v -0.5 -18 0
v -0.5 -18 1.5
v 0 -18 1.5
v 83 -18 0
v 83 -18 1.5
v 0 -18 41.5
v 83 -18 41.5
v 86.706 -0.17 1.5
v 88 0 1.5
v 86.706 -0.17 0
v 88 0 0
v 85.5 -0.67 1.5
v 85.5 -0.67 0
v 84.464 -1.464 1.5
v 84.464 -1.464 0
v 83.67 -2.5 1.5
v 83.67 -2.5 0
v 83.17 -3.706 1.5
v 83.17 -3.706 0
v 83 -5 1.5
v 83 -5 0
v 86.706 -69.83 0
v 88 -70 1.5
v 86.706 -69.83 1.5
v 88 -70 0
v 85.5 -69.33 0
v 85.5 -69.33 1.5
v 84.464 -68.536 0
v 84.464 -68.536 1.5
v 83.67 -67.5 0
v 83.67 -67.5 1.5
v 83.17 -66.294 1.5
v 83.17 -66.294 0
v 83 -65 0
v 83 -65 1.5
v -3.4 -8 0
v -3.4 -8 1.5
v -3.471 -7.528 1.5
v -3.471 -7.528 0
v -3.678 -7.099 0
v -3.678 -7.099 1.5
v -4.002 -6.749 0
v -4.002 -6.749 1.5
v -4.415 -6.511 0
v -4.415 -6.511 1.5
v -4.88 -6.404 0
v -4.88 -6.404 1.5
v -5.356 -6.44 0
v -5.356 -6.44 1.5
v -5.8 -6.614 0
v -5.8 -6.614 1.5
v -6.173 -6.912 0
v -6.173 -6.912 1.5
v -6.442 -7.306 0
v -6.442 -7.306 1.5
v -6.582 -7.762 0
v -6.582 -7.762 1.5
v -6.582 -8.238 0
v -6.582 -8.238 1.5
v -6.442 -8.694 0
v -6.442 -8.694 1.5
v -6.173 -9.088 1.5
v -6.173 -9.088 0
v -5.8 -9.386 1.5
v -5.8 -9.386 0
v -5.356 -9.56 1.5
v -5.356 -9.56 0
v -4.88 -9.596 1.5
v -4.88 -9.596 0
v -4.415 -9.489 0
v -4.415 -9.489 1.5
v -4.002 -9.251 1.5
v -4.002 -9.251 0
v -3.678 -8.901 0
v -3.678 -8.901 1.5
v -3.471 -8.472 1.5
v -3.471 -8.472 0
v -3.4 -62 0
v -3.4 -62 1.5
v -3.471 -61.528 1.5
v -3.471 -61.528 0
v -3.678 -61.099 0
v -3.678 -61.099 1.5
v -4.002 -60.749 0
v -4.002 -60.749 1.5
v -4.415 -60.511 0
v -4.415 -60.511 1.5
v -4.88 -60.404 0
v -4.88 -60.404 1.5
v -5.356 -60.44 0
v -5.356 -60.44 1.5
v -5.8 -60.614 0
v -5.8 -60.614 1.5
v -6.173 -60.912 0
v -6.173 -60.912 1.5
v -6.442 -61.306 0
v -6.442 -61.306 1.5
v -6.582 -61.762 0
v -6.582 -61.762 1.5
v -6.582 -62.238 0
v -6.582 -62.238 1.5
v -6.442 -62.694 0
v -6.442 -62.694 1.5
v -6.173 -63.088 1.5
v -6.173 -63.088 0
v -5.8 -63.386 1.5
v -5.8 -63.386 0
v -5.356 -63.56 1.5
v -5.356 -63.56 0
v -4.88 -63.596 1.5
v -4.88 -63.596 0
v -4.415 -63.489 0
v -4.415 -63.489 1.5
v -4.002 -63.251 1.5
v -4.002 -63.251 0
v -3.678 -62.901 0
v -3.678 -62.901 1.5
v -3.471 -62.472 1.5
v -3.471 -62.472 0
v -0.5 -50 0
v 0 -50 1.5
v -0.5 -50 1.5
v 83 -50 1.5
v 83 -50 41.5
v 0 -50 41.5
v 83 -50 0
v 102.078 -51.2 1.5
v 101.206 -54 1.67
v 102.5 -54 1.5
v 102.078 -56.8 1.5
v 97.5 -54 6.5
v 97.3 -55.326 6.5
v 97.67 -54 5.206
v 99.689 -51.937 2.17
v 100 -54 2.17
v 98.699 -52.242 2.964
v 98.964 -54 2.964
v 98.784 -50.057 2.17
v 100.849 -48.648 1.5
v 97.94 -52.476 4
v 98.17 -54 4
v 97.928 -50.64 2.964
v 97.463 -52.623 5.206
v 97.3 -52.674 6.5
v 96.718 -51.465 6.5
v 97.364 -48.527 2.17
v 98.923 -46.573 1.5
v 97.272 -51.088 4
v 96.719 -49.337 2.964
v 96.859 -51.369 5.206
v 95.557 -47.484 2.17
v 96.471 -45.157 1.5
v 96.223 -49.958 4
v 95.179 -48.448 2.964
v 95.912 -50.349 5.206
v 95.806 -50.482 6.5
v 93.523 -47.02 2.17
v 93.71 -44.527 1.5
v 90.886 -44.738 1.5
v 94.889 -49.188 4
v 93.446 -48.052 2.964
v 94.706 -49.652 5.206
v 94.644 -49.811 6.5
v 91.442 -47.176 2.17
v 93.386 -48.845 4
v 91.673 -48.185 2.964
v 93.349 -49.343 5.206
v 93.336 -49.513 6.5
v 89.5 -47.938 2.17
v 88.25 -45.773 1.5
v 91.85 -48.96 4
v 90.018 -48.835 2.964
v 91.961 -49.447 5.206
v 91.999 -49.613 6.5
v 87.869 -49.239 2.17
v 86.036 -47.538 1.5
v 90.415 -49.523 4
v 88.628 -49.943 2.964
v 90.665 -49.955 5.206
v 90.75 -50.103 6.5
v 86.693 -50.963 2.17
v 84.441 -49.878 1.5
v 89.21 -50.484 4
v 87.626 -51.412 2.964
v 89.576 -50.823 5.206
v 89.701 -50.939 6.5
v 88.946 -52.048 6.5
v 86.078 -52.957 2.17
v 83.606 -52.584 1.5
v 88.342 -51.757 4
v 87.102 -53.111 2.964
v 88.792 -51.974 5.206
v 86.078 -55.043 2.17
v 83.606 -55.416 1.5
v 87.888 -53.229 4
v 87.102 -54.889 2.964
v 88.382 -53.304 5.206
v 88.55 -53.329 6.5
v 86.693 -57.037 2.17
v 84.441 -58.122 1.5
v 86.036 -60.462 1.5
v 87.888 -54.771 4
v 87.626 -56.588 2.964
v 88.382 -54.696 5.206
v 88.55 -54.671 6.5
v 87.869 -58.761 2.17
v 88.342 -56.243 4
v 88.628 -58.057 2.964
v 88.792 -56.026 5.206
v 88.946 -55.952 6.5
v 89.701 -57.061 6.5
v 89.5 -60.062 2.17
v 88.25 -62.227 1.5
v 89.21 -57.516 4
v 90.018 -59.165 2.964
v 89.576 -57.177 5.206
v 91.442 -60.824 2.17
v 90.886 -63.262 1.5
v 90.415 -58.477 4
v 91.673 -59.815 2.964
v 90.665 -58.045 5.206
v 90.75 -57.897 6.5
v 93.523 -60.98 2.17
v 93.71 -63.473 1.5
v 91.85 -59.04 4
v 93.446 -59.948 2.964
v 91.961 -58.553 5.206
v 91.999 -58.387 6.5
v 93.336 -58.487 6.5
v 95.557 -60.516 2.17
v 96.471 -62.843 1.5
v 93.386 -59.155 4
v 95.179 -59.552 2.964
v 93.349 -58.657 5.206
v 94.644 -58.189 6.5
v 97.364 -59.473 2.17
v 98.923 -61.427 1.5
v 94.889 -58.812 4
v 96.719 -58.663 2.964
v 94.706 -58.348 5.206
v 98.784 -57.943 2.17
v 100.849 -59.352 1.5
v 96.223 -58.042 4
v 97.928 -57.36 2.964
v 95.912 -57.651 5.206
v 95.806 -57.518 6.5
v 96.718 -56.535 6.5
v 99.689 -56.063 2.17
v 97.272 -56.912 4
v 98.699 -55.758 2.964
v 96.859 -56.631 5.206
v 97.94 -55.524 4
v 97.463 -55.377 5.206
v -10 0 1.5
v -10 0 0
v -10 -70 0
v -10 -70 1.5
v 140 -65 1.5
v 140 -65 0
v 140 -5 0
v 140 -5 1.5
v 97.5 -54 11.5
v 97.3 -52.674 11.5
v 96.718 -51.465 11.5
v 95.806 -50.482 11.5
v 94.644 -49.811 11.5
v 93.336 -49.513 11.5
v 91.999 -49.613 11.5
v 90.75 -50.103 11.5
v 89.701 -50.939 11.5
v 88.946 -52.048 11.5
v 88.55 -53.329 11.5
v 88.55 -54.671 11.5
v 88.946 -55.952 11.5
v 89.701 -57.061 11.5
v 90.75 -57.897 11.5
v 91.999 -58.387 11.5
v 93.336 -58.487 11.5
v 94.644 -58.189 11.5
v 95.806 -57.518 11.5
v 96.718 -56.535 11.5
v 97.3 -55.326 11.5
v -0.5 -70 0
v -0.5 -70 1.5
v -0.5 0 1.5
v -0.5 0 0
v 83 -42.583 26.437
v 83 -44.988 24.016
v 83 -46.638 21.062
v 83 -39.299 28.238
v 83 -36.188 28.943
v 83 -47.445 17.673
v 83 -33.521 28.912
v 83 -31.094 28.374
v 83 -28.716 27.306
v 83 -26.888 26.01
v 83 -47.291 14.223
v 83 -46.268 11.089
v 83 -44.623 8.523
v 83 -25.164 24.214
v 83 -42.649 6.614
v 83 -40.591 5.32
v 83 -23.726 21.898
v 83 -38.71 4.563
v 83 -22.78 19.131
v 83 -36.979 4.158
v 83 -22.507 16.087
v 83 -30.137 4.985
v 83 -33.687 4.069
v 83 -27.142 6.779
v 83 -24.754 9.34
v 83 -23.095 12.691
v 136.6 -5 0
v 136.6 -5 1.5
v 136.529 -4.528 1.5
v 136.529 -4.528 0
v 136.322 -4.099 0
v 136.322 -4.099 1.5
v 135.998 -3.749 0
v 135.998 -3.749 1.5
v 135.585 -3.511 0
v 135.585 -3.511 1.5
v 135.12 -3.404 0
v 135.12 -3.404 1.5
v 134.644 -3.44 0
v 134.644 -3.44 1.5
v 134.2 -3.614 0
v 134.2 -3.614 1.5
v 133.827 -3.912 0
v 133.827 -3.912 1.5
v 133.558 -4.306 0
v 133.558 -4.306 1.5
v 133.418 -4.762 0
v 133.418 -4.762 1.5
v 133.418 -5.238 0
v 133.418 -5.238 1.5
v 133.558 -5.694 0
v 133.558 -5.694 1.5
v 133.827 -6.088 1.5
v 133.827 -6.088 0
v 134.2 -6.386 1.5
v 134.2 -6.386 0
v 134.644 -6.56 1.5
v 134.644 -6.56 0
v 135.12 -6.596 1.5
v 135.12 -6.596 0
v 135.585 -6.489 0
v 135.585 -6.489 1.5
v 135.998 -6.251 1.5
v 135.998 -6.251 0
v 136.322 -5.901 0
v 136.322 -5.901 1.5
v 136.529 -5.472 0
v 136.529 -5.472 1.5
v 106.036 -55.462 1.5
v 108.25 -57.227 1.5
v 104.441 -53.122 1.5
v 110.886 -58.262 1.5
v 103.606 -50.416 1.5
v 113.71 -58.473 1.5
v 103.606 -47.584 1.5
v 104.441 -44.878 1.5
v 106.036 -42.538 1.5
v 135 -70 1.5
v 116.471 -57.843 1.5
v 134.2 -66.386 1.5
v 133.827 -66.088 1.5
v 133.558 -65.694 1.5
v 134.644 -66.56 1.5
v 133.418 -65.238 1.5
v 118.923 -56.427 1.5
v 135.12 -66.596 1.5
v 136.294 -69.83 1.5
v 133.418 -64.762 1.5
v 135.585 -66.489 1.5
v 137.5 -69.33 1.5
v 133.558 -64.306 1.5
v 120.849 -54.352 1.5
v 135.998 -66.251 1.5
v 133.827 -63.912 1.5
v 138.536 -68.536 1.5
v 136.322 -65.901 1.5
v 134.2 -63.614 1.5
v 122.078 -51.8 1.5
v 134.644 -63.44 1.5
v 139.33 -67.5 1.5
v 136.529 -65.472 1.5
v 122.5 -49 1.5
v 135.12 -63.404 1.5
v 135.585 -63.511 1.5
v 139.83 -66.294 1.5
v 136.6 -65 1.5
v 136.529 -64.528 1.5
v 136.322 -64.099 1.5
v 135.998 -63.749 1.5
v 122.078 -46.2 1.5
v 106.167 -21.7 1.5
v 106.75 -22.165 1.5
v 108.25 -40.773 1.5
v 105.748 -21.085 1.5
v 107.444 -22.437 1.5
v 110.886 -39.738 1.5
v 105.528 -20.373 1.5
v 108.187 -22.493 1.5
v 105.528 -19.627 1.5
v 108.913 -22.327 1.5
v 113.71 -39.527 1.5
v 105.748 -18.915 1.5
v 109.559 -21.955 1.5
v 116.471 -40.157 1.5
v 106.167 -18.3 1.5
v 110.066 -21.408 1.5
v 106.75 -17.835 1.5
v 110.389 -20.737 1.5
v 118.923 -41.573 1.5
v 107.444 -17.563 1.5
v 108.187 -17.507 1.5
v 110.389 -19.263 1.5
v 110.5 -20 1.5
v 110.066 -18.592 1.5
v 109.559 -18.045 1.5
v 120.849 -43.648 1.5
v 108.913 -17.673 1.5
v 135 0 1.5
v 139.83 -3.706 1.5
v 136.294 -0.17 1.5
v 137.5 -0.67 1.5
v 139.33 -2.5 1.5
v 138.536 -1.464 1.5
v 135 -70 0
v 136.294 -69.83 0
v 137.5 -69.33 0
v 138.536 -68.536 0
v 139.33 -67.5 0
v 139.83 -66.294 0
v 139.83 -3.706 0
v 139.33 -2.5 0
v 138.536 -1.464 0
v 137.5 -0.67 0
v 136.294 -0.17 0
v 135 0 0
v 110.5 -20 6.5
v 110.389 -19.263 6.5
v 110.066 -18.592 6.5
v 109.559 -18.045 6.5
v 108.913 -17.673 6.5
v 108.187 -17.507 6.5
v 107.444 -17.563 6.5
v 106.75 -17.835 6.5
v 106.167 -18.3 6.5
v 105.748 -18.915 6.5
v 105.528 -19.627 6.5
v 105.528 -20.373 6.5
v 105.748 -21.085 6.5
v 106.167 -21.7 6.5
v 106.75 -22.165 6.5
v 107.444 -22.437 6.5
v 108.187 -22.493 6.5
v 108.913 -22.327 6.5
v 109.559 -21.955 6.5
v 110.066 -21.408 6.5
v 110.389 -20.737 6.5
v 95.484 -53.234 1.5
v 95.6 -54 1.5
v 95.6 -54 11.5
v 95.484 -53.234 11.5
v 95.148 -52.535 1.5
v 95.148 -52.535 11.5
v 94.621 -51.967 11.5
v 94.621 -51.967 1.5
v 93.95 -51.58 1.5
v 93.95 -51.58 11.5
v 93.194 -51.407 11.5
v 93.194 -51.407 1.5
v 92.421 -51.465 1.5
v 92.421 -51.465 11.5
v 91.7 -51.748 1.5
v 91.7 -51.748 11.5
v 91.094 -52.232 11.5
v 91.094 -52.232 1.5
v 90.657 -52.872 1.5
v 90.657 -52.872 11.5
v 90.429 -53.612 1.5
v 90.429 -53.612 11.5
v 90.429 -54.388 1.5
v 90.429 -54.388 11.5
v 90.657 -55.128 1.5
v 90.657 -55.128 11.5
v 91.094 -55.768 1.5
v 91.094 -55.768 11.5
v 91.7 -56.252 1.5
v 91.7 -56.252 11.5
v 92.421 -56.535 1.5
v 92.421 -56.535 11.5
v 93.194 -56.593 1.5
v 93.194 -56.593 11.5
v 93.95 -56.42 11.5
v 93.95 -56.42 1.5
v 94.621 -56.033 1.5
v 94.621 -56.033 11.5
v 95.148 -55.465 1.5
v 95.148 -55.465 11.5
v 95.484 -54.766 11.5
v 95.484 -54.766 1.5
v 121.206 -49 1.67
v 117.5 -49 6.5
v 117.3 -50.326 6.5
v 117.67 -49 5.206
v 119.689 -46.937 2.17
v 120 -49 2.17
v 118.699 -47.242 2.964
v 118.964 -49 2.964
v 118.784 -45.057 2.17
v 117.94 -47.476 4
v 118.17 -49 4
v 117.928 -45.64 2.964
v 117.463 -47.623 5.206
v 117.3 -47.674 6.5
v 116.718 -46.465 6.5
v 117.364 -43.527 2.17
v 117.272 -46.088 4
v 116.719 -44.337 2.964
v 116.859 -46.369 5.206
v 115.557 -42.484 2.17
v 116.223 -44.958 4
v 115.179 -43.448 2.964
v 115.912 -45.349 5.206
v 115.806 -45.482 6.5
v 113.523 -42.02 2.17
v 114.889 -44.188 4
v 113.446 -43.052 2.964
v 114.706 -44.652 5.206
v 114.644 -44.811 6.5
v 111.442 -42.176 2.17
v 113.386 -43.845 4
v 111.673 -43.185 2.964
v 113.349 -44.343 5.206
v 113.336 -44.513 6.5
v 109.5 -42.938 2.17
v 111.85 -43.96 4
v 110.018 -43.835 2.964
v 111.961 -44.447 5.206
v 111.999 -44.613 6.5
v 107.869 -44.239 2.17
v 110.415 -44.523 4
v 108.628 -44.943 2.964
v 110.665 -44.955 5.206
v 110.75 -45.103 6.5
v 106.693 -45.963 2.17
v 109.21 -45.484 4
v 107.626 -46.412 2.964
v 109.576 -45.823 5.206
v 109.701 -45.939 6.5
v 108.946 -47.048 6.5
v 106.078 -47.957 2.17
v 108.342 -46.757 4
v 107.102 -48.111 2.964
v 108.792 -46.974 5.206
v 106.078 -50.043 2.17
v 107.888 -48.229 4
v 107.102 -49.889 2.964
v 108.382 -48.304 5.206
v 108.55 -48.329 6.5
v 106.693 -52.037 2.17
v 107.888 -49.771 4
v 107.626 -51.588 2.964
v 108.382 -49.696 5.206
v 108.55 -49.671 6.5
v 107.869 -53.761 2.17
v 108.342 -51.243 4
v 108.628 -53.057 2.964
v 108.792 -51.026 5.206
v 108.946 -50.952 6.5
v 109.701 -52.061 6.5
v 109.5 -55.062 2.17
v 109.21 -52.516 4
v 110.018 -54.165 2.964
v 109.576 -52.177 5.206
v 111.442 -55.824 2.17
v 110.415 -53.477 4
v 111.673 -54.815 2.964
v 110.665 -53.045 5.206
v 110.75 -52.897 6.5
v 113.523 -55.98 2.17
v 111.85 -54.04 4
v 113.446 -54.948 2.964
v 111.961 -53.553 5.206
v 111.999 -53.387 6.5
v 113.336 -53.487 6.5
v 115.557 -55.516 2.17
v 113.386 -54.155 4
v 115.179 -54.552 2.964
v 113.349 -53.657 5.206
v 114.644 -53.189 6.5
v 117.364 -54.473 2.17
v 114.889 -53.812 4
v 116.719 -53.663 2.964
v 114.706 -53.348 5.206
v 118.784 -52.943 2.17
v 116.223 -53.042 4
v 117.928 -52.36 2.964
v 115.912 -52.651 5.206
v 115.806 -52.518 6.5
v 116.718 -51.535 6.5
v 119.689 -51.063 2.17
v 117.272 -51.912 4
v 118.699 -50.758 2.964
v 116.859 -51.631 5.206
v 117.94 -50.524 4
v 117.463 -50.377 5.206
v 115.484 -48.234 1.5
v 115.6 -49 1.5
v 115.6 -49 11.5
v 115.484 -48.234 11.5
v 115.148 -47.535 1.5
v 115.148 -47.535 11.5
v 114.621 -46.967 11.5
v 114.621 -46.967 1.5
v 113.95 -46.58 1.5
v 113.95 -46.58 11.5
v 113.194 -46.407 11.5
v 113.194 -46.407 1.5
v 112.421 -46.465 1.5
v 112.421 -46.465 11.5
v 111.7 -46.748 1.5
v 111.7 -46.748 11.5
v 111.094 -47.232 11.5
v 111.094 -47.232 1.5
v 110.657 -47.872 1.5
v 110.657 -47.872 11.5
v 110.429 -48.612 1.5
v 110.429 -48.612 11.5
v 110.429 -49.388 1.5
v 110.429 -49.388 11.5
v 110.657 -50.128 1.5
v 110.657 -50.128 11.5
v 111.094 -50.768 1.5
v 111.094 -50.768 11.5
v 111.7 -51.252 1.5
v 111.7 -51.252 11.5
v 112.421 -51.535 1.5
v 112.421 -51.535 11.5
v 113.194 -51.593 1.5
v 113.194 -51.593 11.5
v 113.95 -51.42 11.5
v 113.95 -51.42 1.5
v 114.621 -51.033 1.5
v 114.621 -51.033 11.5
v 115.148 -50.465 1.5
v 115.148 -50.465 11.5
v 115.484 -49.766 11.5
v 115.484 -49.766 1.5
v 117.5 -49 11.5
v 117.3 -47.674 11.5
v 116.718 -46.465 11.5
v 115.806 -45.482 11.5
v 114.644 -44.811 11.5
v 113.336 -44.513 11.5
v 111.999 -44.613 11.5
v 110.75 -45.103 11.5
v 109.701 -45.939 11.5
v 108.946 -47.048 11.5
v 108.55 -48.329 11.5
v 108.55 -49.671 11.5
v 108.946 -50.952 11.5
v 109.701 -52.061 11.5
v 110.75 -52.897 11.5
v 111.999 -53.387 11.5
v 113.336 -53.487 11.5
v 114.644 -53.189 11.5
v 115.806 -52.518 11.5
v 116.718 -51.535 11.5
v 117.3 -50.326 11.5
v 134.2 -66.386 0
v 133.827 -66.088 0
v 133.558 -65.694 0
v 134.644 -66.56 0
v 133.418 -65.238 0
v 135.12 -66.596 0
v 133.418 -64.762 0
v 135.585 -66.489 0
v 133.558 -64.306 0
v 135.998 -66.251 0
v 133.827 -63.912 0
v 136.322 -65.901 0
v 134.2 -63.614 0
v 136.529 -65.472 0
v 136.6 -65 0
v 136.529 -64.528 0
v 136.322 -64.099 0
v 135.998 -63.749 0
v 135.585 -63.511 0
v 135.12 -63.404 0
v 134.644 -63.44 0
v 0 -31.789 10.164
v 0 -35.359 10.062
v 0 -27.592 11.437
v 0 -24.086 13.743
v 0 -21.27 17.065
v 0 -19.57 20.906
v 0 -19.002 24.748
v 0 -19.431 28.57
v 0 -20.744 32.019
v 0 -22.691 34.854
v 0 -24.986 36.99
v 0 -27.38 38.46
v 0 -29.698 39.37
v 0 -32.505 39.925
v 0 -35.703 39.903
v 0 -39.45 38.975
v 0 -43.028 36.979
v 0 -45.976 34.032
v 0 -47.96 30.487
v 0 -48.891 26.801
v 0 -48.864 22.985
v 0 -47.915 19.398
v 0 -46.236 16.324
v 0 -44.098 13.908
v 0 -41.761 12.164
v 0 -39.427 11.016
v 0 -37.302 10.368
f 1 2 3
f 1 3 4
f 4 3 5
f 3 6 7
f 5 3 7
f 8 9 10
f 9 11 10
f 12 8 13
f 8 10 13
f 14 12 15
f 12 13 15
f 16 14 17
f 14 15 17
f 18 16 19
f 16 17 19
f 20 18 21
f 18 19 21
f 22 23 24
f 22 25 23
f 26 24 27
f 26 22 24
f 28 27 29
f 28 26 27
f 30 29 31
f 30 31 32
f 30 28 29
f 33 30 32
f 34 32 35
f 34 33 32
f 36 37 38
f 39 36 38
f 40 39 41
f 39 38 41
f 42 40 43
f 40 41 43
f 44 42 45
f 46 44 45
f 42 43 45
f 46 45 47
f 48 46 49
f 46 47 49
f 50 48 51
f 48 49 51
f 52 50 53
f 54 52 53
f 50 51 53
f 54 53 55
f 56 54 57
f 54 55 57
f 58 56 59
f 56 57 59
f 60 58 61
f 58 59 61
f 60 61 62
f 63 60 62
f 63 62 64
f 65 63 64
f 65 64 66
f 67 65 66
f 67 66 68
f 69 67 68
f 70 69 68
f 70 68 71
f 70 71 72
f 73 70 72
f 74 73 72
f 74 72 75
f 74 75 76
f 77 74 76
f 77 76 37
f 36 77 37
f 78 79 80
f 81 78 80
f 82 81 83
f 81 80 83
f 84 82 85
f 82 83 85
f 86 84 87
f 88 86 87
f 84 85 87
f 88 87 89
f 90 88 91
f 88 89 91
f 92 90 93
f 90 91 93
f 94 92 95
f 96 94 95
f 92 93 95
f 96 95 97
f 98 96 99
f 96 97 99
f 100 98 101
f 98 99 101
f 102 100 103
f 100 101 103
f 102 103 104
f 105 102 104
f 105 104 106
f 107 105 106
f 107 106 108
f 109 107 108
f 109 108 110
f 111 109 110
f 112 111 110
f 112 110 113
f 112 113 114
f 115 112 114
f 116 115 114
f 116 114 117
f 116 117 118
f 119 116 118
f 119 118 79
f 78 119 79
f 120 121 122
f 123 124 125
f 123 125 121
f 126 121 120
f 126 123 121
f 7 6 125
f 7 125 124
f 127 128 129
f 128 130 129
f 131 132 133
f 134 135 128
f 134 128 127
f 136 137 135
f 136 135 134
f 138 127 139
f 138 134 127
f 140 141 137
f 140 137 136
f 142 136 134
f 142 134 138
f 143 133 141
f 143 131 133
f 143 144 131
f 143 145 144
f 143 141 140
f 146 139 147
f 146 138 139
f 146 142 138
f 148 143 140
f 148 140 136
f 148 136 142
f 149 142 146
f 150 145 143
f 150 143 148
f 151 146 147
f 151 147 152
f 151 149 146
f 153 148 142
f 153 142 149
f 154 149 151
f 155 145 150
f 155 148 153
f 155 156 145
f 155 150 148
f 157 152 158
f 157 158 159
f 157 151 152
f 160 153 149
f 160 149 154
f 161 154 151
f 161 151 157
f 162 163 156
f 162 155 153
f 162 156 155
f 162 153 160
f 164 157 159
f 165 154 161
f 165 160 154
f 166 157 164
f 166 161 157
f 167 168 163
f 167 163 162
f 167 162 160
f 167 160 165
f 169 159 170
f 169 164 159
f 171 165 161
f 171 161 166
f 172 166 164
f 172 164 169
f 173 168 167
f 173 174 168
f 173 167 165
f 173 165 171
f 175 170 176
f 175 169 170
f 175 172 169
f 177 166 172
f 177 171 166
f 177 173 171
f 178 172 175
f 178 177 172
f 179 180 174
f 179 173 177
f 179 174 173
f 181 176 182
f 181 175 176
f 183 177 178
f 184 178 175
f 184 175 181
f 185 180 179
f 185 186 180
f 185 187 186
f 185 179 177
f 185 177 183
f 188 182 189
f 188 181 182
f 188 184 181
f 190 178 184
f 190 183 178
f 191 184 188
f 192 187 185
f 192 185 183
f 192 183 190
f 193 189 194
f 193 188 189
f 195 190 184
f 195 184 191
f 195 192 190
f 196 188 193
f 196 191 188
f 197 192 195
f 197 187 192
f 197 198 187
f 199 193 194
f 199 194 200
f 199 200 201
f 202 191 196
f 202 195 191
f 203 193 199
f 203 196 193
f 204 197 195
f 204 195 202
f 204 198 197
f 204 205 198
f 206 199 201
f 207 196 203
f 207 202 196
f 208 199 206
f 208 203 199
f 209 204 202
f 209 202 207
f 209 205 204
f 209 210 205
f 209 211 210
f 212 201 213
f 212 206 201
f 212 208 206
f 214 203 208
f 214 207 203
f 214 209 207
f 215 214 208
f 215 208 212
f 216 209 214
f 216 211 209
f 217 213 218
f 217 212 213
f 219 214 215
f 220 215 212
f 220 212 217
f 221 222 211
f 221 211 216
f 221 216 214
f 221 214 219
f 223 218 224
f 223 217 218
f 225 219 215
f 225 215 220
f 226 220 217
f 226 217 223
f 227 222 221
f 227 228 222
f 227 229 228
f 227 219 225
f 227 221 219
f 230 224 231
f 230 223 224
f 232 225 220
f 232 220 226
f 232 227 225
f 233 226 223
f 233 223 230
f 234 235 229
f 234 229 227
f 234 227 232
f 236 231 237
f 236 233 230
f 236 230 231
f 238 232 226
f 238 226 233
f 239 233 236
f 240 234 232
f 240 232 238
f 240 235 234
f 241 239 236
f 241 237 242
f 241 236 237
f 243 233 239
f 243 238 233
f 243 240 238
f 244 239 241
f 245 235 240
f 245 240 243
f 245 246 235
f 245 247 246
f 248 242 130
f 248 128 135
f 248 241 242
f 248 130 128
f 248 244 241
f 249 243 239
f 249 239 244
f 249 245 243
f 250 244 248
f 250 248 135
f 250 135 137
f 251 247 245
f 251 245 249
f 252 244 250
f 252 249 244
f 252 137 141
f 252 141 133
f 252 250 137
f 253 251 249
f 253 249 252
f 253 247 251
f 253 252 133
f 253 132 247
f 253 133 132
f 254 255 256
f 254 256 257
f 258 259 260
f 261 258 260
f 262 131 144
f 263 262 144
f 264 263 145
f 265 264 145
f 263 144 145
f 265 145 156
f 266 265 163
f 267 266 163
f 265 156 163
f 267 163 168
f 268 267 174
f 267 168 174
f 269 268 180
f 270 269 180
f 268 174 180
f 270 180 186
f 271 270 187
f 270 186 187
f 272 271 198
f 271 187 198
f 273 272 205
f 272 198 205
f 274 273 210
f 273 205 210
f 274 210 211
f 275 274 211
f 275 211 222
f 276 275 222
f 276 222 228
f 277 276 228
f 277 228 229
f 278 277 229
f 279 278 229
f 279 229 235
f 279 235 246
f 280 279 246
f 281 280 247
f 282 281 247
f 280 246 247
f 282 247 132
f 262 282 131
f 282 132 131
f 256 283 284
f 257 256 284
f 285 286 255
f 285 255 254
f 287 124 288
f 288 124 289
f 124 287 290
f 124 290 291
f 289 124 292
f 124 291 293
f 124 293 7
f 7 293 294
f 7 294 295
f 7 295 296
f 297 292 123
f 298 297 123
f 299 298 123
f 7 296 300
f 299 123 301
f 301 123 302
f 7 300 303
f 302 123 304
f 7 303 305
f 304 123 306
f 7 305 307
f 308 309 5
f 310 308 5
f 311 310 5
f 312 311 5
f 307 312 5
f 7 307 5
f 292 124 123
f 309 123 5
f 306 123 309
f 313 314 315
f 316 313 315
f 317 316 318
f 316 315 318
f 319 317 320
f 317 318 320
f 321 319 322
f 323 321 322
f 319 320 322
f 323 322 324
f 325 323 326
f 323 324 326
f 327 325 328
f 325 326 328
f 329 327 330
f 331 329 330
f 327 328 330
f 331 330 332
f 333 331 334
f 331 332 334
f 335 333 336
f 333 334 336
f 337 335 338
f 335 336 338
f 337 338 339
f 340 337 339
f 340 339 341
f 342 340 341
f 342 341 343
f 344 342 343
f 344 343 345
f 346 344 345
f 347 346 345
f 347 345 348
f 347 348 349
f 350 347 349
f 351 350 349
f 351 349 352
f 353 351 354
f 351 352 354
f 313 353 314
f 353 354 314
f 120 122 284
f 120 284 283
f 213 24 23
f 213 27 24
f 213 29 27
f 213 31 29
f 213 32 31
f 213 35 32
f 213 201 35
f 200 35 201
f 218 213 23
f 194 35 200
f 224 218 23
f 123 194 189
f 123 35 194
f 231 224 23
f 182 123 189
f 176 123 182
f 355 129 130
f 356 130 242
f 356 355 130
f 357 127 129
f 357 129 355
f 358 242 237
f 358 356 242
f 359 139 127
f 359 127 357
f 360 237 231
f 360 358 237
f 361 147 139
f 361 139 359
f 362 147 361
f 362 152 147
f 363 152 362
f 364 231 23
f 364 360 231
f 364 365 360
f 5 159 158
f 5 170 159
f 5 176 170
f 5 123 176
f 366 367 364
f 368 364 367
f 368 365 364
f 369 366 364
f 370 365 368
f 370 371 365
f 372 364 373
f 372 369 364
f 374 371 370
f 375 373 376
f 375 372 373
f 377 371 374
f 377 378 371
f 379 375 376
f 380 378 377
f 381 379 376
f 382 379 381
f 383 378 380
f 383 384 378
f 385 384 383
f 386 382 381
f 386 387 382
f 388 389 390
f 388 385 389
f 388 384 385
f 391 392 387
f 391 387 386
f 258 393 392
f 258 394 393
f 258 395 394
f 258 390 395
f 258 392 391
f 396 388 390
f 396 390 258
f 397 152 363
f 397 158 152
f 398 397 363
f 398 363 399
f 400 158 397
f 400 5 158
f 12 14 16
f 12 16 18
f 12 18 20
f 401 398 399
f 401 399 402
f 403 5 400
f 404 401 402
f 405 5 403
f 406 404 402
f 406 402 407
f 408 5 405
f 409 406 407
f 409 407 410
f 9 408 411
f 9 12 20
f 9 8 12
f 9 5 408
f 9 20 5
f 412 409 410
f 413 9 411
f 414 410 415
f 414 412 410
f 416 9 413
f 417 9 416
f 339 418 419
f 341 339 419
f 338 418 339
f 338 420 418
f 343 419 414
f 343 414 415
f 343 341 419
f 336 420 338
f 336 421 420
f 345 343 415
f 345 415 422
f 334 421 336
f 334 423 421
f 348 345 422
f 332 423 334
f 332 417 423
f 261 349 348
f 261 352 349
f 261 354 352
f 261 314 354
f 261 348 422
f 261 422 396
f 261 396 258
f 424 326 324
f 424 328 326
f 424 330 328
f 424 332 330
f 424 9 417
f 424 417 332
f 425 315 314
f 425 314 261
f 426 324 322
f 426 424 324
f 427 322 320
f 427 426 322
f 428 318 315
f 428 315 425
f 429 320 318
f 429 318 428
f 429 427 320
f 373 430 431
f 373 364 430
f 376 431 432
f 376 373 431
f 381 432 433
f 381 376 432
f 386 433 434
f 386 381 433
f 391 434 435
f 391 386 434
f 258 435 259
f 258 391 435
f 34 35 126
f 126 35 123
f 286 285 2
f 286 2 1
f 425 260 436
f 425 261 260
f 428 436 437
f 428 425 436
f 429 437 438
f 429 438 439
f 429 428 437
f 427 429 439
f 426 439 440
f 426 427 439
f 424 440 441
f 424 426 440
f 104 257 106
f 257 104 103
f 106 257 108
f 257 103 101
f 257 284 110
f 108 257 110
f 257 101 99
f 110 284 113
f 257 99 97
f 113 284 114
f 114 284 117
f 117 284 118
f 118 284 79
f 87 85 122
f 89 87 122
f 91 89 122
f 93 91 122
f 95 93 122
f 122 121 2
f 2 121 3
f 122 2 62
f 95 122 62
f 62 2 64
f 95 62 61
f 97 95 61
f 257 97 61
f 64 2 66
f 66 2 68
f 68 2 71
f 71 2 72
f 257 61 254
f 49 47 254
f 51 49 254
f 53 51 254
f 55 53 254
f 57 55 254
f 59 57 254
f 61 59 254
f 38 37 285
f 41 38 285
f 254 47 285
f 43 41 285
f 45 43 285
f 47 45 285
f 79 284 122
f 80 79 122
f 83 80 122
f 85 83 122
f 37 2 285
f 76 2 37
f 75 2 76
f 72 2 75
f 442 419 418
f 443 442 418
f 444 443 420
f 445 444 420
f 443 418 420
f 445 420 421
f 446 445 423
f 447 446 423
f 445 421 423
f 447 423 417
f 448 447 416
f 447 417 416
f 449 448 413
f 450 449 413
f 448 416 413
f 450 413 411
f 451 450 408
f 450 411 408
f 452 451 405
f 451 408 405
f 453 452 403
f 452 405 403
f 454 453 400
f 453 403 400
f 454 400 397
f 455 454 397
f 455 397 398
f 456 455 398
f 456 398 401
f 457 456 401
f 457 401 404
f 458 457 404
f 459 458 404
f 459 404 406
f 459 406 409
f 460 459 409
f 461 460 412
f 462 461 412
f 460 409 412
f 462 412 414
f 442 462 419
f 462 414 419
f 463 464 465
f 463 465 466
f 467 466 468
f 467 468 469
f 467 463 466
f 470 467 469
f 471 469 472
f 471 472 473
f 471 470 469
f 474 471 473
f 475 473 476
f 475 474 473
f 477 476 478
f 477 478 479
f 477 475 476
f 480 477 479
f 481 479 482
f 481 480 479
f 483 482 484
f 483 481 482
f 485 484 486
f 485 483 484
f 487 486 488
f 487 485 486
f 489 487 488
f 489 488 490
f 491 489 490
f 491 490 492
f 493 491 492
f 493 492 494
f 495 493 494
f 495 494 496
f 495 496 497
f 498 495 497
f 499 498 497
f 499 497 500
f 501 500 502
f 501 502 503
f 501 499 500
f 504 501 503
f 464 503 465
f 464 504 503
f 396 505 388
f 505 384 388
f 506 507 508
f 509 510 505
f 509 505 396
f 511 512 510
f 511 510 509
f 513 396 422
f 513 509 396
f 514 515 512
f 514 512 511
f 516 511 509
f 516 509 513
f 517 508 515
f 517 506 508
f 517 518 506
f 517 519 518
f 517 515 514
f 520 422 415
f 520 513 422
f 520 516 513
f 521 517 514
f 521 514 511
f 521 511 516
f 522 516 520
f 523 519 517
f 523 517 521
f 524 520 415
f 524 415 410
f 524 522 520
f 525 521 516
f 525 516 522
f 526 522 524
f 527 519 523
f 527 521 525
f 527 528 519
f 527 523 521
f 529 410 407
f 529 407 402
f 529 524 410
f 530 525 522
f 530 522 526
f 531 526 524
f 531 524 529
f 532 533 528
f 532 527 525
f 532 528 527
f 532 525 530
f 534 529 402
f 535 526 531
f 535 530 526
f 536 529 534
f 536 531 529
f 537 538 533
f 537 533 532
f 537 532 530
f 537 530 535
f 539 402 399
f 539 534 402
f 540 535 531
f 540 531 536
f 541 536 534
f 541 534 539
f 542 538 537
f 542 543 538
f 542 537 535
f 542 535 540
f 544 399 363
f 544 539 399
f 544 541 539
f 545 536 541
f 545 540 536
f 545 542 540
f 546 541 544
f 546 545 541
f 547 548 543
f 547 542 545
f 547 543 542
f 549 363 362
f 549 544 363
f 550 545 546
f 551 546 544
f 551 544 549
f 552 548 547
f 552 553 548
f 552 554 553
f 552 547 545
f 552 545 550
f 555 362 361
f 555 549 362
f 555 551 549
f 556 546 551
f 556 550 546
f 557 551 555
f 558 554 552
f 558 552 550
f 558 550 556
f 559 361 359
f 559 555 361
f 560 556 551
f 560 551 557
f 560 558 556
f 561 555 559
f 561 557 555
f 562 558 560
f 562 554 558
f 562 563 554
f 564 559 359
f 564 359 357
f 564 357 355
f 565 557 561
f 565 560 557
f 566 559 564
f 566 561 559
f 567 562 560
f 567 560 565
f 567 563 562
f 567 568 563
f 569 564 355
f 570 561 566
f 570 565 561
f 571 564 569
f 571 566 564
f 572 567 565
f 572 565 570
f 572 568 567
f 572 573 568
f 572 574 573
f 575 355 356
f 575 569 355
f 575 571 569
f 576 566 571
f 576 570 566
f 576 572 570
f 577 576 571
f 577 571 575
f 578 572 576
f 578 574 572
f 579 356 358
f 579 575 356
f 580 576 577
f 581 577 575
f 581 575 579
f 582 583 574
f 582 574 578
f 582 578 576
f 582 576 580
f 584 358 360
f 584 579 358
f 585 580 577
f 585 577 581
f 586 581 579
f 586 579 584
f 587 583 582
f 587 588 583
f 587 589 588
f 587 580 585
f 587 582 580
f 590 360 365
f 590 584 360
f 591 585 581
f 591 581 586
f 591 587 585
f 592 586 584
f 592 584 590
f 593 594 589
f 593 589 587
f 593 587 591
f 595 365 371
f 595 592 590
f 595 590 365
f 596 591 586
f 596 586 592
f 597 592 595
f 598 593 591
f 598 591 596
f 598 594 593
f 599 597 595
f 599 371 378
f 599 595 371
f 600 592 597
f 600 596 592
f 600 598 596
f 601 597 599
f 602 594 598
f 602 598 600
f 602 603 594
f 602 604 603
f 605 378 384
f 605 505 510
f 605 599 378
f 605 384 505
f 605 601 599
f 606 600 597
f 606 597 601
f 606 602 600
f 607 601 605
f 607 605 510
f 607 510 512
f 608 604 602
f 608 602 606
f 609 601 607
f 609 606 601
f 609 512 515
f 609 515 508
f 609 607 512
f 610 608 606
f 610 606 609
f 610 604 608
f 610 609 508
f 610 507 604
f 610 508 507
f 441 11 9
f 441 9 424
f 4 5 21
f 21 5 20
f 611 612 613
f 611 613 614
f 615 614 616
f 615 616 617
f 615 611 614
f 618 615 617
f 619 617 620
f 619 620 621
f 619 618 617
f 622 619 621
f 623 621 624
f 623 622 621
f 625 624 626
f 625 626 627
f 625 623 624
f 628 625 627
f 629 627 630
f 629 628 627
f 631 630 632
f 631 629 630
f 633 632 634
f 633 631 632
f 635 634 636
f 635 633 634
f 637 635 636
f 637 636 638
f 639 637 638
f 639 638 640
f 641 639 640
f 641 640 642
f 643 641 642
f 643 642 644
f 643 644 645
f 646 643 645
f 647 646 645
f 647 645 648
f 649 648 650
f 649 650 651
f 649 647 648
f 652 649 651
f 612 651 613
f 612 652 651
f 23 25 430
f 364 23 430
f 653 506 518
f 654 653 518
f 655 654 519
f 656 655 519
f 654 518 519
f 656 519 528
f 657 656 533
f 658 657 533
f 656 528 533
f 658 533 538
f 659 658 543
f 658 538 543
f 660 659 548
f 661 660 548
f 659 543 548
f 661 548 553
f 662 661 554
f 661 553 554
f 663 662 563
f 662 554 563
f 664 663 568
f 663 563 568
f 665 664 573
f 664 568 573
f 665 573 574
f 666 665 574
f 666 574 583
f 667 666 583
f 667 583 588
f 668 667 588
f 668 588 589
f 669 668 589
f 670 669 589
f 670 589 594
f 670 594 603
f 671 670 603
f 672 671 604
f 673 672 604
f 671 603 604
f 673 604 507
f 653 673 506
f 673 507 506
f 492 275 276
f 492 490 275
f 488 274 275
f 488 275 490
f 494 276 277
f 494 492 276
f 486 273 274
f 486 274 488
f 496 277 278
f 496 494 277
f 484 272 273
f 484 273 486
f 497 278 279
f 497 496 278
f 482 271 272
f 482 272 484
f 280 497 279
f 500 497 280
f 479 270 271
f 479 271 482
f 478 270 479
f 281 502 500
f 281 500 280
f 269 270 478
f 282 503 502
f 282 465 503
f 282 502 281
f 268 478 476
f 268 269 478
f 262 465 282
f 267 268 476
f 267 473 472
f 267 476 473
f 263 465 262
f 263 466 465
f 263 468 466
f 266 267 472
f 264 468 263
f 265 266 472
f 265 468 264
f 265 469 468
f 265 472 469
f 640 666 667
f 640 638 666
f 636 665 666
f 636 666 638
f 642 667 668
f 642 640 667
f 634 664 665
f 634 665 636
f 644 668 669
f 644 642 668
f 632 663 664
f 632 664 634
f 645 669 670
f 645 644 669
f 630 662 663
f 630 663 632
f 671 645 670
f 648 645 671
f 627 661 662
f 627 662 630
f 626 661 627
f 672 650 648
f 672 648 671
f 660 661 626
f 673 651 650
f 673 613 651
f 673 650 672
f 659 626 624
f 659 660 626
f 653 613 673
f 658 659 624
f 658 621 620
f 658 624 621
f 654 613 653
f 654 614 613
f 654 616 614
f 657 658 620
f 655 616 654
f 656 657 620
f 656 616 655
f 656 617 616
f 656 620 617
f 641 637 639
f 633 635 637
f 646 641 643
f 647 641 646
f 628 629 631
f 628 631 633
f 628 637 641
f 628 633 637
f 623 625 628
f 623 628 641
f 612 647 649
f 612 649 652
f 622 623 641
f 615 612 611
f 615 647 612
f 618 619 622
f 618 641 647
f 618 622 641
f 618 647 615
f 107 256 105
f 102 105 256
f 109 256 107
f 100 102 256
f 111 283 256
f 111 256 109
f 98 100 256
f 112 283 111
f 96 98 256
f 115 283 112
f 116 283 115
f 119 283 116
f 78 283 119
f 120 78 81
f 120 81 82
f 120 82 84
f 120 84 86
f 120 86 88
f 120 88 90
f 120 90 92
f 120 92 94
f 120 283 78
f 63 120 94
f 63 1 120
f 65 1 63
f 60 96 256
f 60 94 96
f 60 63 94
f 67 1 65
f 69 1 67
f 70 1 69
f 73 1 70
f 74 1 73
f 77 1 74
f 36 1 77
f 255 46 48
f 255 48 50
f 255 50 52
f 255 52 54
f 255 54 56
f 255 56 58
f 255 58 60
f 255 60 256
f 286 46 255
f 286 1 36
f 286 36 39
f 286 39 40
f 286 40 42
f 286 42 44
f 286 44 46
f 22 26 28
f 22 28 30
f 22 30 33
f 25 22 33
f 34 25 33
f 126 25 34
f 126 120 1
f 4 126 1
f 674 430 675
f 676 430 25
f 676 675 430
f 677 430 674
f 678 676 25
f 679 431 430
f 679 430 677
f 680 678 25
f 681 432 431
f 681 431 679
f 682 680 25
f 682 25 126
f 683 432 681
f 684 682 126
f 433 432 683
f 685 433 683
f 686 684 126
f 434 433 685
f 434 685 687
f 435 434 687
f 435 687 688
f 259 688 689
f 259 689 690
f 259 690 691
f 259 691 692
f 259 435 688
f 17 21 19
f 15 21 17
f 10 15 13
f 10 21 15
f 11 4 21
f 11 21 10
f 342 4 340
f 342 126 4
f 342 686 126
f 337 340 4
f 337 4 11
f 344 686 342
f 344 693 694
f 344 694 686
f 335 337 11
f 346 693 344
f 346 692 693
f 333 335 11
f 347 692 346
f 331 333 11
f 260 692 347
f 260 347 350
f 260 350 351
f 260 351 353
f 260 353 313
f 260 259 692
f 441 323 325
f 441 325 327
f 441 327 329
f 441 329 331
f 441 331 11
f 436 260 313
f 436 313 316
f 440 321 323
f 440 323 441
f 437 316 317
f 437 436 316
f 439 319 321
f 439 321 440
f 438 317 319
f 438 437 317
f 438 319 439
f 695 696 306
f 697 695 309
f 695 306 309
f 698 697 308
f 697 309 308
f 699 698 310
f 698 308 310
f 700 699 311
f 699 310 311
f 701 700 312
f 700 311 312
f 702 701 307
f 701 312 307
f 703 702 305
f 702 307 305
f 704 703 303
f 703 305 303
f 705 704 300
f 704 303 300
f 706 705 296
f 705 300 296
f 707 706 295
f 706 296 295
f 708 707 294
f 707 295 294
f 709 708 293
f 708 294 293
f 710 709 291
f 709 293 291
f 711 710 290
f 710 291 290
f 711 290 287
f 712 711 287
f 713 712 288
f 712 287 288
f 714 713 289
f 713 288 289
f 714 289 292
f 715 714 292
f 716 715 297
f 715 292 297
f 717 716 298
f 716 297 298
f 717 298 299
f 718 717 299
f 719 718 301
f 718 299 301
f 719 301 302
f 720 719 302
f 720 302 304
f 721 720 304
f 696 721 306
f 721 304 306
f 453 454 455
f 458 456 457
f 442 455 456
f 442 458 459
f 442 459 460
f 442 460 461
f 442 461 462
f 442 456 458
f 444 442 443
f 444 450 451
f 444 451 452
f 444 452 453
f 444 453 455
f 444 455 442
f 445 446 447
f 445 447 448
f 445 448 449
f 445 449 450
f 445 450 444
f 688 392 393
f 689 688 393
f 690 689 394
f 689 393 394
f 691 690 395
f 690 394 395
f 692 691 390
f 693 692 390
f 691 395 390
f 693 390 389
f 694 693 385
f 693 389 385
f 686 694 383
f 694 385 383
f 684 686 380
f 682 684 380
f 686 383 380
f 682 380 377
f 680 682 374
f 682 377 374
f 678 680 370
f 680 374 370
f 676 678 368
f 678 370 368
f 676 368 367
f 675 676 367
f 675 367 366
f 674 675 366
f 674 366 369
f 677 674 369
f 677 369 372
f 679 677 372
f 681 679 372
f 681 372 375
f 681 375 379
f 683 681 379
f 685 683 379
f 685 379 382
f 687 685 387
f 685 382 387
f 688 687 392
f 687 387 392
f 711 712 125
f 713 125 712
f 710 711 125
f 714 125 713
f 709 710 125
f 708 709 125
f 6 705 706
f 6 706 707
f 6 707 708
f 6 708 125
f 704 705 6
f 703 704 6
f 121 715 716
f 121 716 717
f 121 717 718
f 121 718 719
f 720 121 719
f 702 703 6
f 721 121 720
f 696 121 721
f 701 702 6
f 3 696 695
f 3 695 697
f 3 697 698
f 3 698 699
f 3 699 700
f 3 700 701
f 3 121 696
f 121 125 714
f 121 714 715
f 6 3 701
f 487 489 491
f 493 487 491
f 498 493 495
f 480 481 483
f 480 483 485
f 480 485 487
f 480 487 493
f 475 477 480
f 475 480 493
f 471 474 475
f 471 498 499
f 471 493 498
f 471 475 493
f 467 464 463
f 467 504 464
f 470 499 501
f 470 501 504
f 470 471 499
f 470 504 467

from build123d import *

# Parameters (mm, degrees)
ESQUISSE1_W             = 140
ESQUISSE1_H             = 70
BOSS_EXTRU_1_DEPTH      = 1.5
ESQUISSE2_R             = 1.6
ENL_V_MAT_EXTRU_2_DEPTH = 1.5
ESQUISSE2_4_R           = 2.5
BOSS_EXTRU_2_DEPTH      = 5
BOSS_EXTRU_3_DEPTH      = 40
ESQUISSE11_R            = 4.5
ESQUISSE11_R_2          = 2.6
BOSS_EXTRU_4_DEPTH      = 10
CONG_1_R                = 5
ESQUISSE14_W            = 83
ESQUISSE14_H            = 18
ESQUISSE14_H_2          = 20
ENL_V_MAT_EXTRU_3_DEPTH = 162.554944214
CONG_3_R                = 5
ESQUISSE17_W            = 1.5
ESQUISSE17_H            = 70
BOSS_EXTRU_5_DEPTH      = 10
ESQUISSE18_R            = 1.6
ENL_V_MAT_EXTRU_4_DEPTH = 162.554944239
ESQUISSE22_W            = 1.5
ESQUISSE22_H            = 18
ESQUISSE22_H_2          = 20
ENL_V_MAT_EXTRU_5_DEPTH = 0.5


with BuildPart() as part:
    # Esquisse1 → Boss.-Extru.1 (new body)
    with BuildSketch(Plane.XY):
        with Locations((70, -35)):
            Rectangle(ESQUISSE1_W, ESQUISSE1_H)
    extrude(amount=BOSS_EXTRU_1_DEPTH)

    # Esquisse2 → Enlèv. mat.-Extru.2 (cut)
    with BuildSketch(Plane.XY.offset(1.5)):
        with Locations((135, -5)):
            Circle(ESQUISSE2_R)
        with Locations((135, -65)):
            Circle(ESQUISSE2_R)
    extrude(amount=-ENL_V_MAT_EXTRU_2_DEPTH, mode=Mode.SUBTRACT)

    # Esquisse2<4> → Boss.-Extru.2 (add)
    with BuildSketch(Plane.XY.offset(1.5)):
        with Locations((108, -20)):
            Circle(ESQUISSE2_4_R)
    extrude(amount=BOSS_EXTRU_2_DEPTH)

    # Esquisse2<5> → Boss.-Extru.3 (add)
    with BuildSketch(Plane.XY.offset(1.5)):
        Polygon((83, -18), (0, -18), (0, -50), (7.5, -50), (75, -50), (76.464784117, -50), (83, -50), (83, -45), align=None)
    extrude(amount=BOSS_EXTRU_3_DEPTH)

    # Esquisse11 → Boss.-Extru.4 (add)
    # profile 1 of 2: a face of its own
    with BuildSketch(Plane.XY.offset(1.5)):
        with Locations((113, -49)):
            Circle(ESQUISSE11_R)
        with Locations((113, -49)):
            Circle(ESQUISSE11_R_2, mode=Mode.SUBTRACT)
    # profile 2 of 2: a face of its own
    with BuildSketch(Plane.XY.offset(1.5)):
        with Locations((93, -54)):
            Circle(ESQUISSE11_R)
        with Locations((93, -54)):
            Circle(ESQUISSE11_R_2, mode=Mode.SUBTRACT)
    extrude(amount=BOSS_EXTRU_4_DEPTH)

    # Congé1
    cong_1_edges = [part.edges().sort_by_distance(p)[0] for p in [
        (108.5, -49, 1.5),
        (88.5, -54, 1.5),
    ]]
    fillet(cong_1_edges, radius=CONG_1_R)

    # Esquisse14 → Enlèv. mat.-Extru.3 (cut, through all)
    with BuildSketch(Plane.XY.offset(1.5)):
        with Locations((41.5, -9)):
            Rectangle(ESQUISSE14_W, ESQUISSE14_H)
        with Locations((41.5, -60)):
            Rectangle(ESQUISSE14_W, ESQUISSE14_H_2)
    extrude(amount=-ENL_V_MAT_EXTRU_3_DEPTH, mode=Mode.SUBTRACT)

    # Congé3
    cong_3_edges = [part.edges().sort_by_distance(p)[0] for p in [
        (83, 0, 0.75),
        (140, 0, 0.75),
        (140, -70, 0.75),
        (83, -70, 0.75),
    ]]
    fillet(cong_3_edges, radius=CONG_3_R)

    # Enlèvement de matière-Lissage1: read off the stored shape, not the designer's step
    # Enlèvement de matière-Lissage1: loft between two sections, ruled curve by curve
    enl_vement_de_mati_re_lissage1_from = [
        Edge.make_bspline([(0, -35.358936945, 10.061683817), (0, -34.736507104, 10.005061444), (0, -34.071276467, 9.983471322), (0, -32.656620792, 10.043511569), (0, -31.906986183, 10.125212836), (0, -30.336715689, 10.432215403), (0, -29.515853558, 10.657740433), (0, -27.835171711, 11.295881241), (0, -26.97522752, 11.708928876), (0, -25.273092172, 12.759040897), (0, -24.43107638, 13.396695447), (0, -22.846227272, 14.910682395), (0, -22.104033135, 15.787505474), (0, -20.813231902, 17.754778804), (0, -20.26561628, 18.845205387), (0, -19.446047462, 21.166299645), (0, -19.174928563, 22.396203373), (0, -18.948439072, 24.885922737), (0, -18.993175694, 26.144559807), (0, -19.380457825, 28.575441159), (0, -19.722320583, 29.746783491), (0, -20.636945499, 31.91468419), (0, -21.20873673, 32.91104037), (0, -22.494376602, 34.686155378), (0, -23.207508016, 35.465281495), (0, -24.692213453, 36.805300064), (0, -25.463508496, 37.366741349), (0, -27.001451353, 38.297680084), (0, -27.768143671, 38.667624764), (0, -29.257240332, 39.252937618), (0, -29.979826835, 39.468566674), (0, -31.360426607, 39.782890995), (0, -32.018633214, 39.88169381), (0, -33.263492896, 39.994938556), (0, -33.928723533, 40.016528678), (0, -35.343379208, 39.956488431), (0, -36.093013817, 39.874787164), (0, -37.663284311, 39.567784597), (0, -38.484146442, 39.342259567), (0, -40.164828289, 38.704118759), (0, -41.02477248, 38.291071124), (0, -42.726907828, 37.240959103), (0, -43.56892362, 36.603304553), (0, -45.153772728, 35.089317605), (0, -45.895966865, 34.212494526), (0, -47.186768098, 32.245221196), (0, -47.73438372, 31.154794613), (0, -48.553952538, 28.833700355), (0, -48.825071437, 27.603796627), (0, -49.051560928, 25.114077263), (0, -49.006824306, 23.855440193), (0, -48.619542175, 21.424558841), (0, -48.277679417, 20.253216509), (0, -47.363054501, 18.08531581), (0, -46.79126327, 17.08895963), (0, -45.505623398, 15.313844622), (0, -44.792491984, 14.534718505), (0, -43.307786547, 13.194699936), (0, -42.536491504, 12.633258651), (0, -40.998548647, 11.702319916), (0, -40.231856329, 11.332375236), (0, -38.742759668, 10.747062382), (0, -38.020173165, 10.531433326), (0, -36.639573393, 10.217109005), (0, -35.981366786, 10.11830619), (0, -35.358936945, 10.061683817)], [0, 0, 0, 0, 0.03125, 0.03125, 0.0625, 0.0625, 0.09375, 0.09375, 0.125, 0.125, 0.15625, 0.15625, 0.1875, 0.1875, 0.21875, 0.21875, 0.25, 0.25, 0.28125, 0.28125, 0.3125, 0.3125, 0.34375, 0.34375, 0.375, 0.375, 0.40625, 0.40625, 0.4375, 0.4375, 0.46875, 0.46875, 0.5, 0.5, 0.53125, 0.53125, 0.5625, 0.5625, 0.59375, 0.59375, 0.625, 0.625, 0.65625, 0.65625, 0.6875, 0.6875, 0.71875, 0.71875, 0.75, 0.75, 0.78125, 0.78125, 0.8125, 0.8125, 0.84375, 0.84375, 0.875, 0.875, 0.90625, 0.90625, 0.9375, 0.9375, 0.96875, 0.96875, 1, 1, 1, 1], 3),
    ]
    enl_vement_de_mati_re_lissage1_to = [
        Edge.make_bspline([(83, -36.978683165, 4.157601006), (83, -36.46441654, 4.075155874), (83, -35.912574895, 4.019404171), (83, -34.733027399, 3.988933266), (83, -34.105143284, 4.014261099), (83, -32.782184956, 4.18027026), (83, -32.086909931, 4.321124739), (83, -30.653339337, 4.756165981), (83, -29.914915742, 5.050704715), (83, -28.440098529, 5.827037097), (83, -27.703817174, 6.30933137), (83, -26.300151244, 7.477991211), (83, -25.633270194, 8.16480105), (83, -24.448315736, 9.727029605), (83, -23.931067977, 10.602484983), (83, -23.117787224, 12.485655838), (83, -22.82249127, 13.492783585), (83, -22.492710742, 15.549850084), (83, -22.458382278, 16.598815077), (83, -22.642231037, 18.641841677), (83, -22.85989188, 19.635114611), (83, -23.497113975, 21.489467093), (83, -23.915879492, 22.35032337), (83, -24.883881149, 23.899199305), (83, -25.432500118, 24.587483568), (83, -26.590728024, 25.785935025), (83, -27.200073831, 26.296542663), (83, -28.425809001, 27.15791298), (83, -29.04220995, 27.509050012), (83, -30.246974936, 28.080293485), (83, -30.835475596, 28.300627173), (83, -31.965435919, 28.640407161), (83, -32.50705021, 28.759953862), (83, -33.53558346, 28.924844126), (83, -34.087425105, 28.980595829), (83, -35.266972601, 29.011066734), (83, -35.894856716, 28.985738901), (83, -37.217815044, 28.81972974), (83, -37.913090069, 28.678875261), (83, -39.346660663, 28.243834019), (83, -40.085084258, 27.949295285), (83, -41.559901471, 27.172962903), (83, -42.296182826, 26.69066863), (83, -43.699848756, 25.522008789), (83, -44.366729806, 24.83519895), (83, -45.551684264, 23.272970395), (83, -46.068932023, 22.397515017), (83, -46.882212776, 20.514344162), (83, -47.17750873, 19.507216415), (83, -47.507289258, 17.450149916), (83, -47.541617722, 16.401184923), (83, -47.357768963, 14.358158323), (83, -47.14010812, 13.364885389), (83, -46.502886025, 11.510532907), (83, -46.084120508, 10.64967663), (83, -45.116118851, 9.100800695), (83, -44.567499882, 8.412516432), (83, -43.409271976, 7.214064975), (83, -42.799926169, 6.703457337), (83, -41.574190999, 5.84208702), (83, -40.95779005, 5.490949988), (83, -39.753025064, 4.919706515), (83, -39.164524404, 4.699372827), (83, -38.034564081, 4.359592839), (83, -37.49294979, 4.240046138), (83, -36.978683165, 4.157601006)], [0, 0, 0, 0, 0.03125, 0.03125, 0.0625, 0.0625, 0.09375, 0.09375, 0.125, 0.125, 0.15625, 0.15625, 0.1875, 0.1875, 0.21875, 0.21875, 0.25, 0.25, 0.28125, 0.28125, 0.3125, 0.3125, 0.34375, 0.34375, 0.375, 0.375, 0.40625, 0.40625, 0.4375, 0.4375, 0.46875, 0.46875, 0.5, 0.5, 0.53125, 0.53125, 0.5625, 0.5625, 0.59375, 0.59375, 0.625, 0.625, 0.65625, 0.65625, 0.6875, 0.6875, 0.71875, 0.71875, 0.75, 0.75, 0.78125, 0.78125, 0.8125, 0.8125, 0.84375, 0.84375, 0.875, 0.875, 0.90625, 0.90625, 0.9375, 0.9375, 0.96875, 0.96875, 1, 1, 1, 1], 3),
    ]
    enl_vement_de_mati_re_lissage1 = Solid(Shell([*[Face.make_surface_from_curves(enl_vement_de_mati_re_lissage1_from[k], enl_vement_de_mati_re_lissage1_to[k]) for k in range(1)], Face(Wire(enl_vement_de_mati_re_lissage1_from)), Face(Wire(enl_vement_de_mati_re_lissage1_to))]))
    add(enl_vement_de_mati_re_lissage1, mode=Mode.SUBTRACT)

    # Esquisse17 → Boss.-Extru.5 (add)
    with BuildSketch(Plane.ZY):
        with Locations((0.75, -35)):
            Rectangle(ESQUISSE17_W, ESQUISSE17_H)
    extrude(amount=BOSS_EXTRU_5_DEPTH)

    # Esquisse18 → Enlèv. mat.-Extru.4 (cut, through all)
    with BuildSketch(Plane.XY.offset(1.5)):
        with Locations((-5, -8)):
            Circle(ESQUISSE18_R)
        with Locations((-5, -62)):
            Circle(ESQUISSE18_R)
    extrude(amount=-ENL_V_MAT_EXTRU_4_DEPTH, mode=Mode.SUBTRACT)

    # Esquisse22 → Enlèv. mat.-Extru.5 (cut)
    with BuildSketch(Plane(origin=(0, 0, 0), x_dir=(0, 0, -1), z_dir=(1, 0, 0))):
        with Locations((-0.75, -9)):
            Rectangle(ESQUISSE22_W, ESQUISSE22_H)
        with Locations((-0.75, -60)):
            Rectangle(ESQUISSE22_W, ESQUISSE22_H_2)
    extrude(amount=-ENL_V_MAT_EXTRU_5_DEPTH, mode=Mode.SUBTRACT)


solid = part.part
